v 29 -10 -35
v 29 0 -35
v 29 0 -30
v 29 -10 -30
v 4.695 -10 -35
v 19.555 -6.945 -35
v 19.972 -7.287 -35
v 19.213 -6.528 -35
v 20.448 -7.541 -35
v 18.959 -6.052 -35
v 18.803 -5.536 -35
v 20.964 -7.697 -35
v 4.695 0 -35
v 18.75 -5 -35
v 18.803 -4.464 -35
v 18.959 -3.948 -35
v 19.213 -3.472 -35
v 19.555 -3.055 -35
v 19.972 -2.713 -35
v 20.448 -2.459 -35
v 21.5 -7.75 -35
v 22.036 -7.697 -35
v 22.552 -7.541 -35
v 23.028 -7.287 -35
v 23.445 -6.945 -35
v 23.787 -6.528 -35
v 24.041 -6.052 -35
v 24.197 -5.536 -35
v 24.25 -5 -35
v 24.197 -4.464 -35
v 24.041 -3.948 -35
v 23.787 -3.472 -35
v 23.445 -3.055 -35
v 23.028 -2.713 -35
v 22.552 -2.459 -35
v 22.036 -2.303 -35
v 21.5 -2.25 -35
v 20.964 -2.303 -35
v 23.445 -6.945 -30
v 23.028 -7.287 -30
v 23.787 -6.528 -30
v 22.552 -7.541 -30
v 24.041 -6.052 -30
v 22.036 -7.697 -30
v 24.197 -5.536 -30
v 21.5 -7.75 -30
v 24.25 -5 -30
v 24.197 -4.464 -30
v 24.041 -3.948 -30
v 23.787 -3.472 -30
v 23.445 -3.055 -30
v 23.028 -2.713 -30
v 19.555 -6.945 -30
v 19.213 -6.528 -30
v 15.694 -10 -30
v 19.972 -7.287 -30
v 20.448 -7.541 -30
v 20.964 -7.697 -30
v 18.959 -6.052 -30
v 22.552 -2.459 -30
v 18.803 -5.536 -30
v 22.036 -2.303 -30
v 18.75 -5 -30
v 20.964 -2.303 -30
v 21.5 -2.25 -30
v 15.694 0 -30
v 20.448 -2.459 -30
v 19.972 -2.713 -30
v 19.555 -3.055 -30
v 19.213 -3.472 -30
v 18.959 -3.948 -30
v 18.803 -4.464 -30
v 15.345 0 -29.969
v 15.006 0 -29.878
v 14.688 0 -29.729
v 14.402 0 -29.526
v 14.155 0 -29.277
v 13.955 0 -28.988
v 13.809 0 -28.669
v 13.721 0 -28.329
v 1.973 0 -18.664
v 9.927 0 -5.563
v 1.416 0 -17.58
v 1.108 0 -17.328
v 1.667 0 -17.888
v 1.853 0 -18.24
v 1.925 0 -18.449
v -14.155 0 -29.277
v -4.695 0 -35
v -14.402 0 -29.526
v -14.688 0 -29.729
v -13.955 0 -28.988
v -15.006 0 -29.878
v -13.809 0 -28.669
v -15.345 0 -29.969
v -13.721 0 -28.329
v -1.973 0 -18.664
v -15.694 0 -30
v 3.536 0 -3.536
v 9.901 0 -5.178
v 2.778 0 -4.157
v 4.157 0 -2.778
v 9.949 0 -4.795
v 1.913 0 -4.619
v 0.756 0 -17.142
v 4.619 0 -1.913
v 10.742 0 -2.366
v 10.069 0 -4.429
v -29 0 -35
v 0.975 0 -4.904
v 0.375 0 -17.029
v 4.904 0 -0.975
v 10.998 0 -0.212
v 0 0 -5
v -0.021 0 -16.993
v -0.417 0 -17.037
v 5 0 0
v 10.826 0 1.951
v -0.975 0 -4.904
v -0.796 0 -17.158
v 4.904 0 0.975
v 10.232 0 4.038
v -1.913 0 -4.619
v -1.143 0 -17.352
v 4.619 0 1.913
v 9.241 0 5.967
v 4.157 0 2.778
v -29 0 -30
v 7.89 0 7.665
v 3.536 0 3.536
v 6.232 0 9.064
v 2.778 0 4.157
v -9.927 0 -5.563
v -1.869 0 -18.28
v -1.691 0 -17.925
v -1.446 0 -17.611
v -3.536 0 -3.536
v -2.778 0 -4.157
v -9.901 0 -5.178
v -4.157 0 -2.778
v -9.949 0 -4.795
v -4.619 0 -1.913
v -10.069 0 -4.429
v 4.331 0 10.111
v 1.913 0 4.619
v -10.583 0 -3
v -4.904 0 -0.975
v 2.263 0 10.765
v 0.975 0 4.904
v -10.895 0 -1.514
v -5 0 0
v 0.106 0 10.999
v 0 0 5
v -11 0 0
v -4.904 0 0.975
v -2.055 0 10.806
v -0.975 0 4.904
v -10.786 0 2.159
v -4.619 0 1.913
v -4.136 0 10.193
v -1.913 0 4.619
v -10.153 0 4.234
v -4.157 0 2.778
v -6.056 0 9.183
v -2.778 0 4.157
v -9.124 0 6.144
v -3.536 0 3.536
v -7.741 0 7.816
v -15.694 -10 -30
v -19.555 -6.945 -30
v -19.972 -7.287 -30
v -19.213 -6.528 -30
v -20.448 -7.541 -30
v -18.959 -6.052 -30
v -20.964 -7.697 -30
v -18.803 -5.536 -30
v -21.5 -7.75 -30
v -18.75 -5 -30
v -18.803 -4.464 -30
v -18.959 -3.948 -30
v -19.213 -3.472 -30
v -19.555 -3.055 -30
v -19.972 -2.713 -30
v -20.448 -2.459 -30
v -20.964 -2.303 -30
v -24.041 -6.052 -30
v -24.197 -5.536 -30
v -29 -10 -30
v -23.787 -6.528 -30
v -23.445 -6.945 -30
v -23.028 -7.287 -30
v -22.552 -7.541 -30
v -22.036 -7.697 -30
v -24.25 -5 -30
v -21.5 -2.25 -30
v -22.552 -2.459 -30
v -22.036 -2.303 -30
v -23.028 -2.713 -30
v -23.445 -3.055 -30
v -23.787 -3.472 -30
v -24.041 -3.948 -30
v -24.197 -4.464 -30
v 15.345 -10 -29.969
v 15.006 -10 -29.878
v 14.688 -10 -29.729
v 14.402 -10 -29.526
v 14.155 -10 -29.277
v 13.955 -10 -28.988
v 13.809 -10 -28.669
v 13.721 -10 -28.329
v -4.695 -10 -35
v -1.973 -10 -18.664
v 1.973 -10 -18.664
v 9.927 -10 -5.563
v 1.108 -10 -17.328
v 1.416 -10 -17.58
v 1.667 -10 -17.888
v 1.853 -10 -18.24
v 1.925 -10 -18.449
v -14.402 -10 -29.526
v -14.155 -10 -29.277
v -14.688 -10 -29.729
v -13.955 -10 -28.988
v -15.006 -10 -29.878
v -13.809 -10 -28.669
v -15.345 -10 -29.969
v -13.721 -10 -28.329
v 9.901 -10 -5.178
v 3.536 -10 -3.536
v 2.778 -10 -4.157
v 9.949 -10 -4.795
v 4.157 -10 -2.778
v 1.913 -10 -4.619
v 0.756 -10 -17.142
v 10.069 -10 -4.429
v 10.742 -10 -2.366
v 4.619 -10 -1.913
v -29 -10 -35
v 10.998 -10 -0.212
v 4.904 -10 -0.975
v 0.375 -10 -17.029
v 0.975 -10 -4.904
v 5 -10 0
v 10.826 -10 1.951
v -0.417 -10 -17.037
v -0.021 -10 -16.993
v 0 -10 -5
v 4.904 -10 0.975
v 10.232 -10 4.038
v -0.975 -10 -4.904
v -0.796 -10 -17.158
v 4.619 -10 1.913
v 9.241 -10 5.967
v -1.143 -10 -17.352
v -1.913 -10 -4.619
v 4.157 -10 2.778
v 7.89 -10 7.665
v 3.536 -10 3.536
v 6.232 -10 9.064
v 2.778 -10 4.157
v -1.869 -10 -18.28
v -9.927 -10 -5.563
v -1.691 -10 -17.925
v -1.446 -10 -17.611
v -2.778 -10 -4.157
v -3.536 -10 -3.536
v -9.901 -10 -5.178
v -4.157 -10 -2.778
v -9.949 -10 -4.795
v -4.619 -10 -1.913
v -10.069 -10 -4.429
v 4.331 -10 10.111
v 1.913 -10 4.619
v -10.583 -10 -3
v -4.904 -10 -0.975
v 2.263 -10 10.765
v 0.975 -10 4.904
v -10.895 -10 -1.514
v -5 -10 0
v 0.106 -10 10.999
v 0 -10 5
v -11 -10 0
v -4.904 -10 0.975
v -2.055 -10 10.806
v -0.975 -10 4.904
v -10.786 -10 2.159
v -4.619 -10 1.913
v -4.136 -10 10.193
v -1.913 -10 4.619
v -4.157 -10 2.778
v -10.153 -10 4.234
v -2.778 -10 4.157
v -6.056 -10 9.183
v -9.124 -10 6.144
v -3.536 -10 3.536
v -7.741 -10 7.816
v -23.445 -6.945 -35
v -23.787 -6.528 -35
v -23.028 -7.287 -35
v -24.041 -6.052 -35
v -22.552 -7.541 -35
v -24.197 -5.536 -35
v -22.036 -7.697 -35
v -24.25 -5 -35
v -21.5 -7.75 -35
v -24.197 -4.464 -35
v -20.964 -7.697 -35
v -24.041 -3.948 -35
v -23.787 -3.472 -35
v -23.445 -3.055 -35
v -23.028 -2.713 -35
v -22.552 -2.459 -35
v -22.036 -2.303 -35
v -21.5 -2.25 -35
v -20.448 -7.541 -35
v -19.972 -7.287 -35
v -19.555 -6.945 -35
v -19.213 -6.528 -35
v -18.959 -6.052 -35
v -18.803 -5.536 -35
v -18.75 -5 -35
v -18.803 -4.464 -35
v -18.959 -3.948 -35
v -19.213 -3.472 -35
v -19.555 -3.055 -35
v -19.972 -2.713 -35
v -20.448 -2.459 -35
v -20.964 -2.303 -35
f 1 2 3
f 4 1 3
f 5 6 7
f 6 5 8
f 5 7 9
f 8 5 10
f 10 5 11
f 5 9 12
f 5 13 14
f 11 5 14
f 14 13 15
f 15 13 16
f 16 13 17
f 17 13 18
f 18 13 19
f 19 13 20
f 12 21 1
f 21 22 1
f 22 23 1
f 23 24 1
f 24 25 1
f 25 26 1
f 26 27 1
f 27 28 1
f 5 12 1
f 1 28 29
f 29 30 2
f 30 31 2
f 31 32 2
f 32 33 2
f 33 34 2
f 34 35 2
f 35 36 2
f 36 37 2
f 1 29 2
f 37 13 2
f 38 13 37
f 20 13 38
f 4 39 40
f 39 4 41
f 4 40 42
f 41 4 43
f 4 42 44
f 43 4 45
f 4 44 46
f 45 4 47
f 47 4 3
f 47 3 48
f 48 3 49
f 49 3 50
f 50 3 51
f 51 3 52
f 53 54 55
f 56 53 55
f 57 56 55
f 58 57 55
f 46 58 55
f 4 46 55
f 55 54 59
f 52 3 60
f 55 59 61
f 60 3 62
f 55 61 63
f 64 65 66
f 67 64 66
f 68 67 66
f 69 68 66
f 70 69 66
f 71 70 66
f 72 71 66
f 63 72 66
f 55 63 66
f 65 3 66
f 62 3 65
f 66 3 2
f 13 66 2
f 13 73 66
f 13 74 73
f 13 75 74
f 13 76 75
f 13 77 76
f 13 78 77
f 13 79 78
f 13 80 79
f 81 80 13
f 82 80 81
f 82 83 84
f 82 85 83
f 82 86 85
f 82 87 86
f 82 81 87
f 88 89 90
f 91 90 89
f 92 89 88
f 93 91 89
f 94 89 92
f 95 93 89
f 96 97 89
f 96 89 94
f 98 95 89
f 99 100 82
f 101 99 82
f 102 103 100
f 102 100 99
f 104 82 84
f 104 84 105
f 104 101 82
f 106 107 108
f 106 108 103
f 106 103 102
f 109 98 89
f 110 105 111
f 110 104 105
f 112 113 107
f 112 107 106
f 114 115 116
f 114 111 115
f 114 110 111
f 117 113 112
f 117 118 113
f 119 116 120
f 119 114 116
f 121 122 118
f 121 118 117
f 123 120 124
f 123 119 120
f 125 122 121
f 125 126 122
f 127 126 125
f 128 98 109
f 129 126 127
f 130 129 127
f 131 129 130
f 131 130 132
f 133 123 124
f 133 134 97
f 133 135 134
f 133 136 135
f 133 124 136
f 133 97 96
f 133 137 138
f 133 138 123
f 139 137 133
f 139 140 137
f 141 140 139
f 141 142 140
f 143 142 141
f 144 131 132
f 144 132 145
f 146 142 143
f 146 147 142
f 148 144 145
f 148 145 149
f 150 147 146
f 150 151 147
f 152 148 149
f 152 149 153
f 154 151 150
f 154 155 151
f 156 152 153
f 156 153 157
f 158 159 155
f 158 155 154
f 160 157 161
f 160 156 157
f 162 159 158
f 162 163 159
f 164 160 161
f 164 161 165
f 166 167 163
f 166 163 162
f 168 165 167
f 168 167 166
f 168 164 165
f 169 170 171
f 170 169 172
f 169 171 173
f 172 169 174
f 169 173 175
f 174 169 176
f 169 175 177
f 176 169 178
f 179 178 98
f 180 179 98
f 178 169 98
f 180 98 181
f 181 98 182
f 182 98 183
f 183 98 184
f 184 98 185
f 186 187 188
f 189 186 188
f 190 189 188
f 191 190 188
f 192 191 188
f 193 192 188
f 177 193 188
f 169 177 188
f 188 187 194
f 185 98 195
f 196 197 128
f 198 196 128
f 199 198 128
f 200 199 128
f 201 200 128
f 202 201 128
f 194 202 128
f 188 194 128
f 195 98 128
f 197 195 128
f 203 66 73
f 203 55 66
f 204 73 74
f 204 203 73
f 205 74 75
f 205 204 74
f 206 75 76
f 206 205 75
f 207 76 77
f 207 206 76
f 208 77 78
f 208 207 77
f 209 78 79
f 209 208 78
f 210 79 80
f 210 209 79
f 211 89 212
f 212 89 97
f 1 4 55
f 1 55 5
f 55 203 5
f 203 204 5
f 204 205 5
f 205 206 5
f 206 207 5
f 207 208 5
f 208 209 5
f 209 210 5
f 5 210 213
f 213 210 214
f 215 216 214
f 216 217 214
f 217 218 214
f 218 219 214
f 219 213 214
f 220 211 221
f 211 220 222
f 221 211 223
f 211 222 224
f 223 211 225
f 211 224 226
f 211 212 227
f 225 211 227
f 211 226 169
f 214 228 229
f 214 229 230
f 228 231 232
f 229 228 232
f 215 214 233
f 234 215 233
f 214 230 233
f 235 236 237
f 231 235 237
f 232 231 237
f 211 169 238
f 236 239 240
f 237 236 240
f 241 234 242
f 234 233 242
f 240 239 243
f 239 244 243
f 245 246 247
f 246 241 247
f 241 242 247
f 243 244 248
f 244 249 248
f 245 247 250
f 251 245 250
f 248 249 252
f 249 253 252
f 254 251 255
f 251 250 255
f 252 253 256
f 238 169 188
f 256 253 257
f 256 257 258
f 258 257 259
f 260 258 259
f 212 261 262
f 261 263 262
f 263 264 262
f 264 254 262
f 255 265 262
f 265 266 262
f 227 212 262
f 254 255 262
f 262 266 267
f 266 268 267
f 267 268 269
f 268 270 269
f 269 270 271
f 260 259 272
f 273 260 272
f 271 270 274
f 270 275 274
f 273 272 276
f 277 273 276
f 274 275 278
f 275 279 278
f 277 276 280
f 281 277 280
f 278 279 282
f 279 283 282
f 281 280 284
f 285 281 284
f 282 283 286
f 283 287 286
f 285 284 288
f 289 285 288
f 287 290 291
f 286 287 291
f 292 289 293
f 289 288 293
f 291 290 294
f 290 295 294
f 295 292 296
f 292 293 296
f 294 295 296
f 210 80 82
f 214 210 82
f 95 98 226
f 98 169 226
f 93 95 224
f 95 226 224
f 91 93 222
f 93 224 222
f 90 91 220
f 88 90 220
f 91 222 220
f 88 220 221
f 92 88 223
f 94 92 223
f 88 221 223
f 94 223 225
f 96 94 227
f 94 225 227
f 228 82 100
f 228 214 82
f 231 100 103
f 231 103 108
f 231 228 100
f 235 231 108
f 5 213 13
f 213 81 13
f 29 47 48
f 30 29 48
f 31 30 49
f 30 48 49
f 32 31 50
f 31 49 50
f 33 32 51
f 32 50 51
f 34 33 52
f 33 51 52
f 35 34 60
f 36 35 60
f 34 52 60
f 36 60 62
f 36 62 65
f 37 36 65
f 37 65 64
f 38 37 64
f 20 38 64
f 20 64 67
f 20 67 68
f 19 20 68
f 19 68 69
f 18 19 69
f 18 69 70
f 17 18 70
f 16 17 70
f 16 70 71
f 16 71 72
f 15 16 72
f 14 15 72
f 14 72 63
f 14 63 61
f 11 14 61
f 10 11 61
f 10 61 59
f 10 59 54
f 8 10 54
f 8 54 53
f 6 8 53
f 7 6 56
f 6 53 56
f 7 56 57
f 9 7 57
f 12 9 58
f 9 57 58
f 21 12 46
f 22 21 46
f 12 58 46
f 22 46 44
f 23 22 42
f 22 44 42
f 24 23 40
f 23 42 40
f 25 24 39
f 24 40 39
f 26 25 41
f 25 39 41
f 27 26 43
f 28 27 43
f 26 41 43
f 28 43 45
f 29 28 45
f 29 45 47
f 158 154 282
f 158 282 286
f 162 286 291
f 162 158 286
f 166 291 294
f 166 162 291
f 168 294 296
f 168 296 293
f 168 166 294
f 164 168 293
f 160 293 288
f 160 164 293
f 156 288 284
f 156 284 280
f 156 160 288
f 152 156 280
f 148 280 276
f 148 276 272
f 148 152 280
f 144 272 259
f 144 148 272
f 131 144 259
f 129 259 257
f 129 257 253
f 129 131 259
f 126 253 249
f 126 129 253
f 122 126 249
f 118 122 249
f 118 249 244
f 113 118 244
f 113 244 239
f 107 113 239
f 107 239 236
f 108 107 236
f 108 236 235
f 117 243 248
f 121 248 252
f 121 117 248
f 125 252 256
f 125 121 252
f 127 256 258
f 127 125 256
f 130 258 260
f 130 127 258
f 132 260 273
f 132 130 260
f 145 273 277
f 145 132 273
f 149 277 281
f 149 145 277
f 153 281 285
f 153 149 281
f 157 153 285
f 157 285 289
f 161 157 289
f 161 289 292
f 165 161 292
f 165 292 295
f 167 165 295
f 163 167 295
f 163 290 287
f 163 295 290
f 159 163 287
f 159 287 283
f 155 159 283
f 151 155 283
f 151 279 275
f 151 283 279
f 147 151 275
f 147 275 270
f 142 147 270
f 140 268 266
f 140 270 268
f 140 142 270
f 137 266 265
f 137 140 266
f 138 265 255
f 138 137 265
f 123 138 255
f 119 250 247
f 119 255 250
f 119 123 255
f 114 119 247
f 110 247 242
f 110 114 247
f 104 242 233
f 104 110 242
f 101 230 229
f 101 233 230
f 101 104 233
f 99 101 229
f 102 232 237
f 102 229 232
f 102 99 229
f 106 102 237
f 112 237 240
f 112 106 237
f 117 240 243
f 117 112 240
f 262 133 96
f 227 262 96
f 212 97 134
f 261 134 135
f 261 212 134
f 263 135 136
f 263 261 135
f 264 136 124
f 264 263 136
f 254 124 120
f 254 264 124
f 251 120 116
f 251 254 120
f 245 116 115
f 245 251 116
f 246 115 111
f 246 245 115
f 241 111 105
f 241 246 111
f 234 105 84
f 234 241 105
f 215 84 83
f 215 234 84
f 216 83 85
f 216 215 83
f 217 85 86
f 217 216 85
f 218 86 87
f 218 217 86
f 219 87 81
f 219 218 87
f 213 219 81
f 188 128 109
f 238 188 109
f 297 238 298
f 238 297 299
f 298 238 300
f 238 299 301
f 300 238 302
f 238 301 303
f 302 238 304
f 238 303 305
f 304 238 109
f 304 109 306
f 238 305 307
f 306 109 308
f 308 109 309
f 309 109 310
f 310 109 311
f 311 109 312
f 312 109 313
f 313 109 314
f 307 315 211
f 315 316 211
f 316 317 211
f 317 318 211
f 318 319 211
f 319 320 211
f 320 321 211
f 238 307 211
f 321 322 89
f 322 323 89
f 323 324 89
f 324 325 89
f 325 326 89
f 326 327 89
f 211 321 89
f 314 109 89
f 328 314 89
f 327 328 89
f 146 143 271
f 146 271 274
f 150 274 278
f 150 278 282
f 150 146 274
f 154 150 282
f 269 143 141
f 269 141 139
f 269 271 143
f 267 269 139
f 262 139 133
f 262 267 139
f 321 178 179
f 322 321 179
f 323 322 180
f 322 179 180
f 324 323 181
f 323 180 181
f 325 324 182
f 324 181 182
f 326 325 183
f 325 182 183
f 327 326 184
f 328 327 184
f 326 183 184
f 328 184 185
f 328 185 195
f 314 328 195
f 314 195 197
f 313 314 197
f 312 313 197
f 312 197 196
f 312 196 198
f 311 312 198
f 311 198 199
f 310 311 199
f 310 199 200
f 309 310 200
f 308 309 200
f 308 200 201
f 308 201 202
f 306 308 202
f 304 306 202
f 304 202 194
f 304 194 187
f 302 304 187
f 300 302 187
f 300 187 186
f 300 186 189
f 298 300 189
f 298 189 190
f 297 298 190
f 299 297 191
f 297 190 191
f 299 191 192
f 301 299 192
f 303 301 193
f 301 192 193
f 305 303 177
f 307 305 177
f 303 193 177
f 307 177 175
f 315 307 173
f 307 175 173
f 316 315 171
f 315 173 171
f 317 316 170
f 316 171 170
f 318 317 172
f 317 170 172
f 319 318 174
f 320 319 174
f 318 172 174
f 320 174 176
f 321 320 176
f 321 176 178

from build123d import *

# Parameters (mm, degrees)
F0_R     = 5
F1_DEPTH = 10
F2_R     = 2.75
F3_DEPTH = 5.001
F4_R     = 5
F5_DEPTH = 10
F6_R     = 2


with BuildPart() as f1:
    # F0 (on Front) → F1 (new body)
    with BuildSketch(Plane.XZ):
        with BuildLine():
            ThreePointArc((-0.3608562494, -8.9927627995), (-6.4902891401, -6.2350739272), (-9, 0))
            Line((-9, 0), (-14, -30))
            Line((-14, -30), (-29, -30))
            Line((-29, -30), (-29, -35))
            Line((-29, -35), (-4.6953957828, -35))
            Line((-4.6953957828, -35), (-0.3608562494, -8.9927627995))
        make_face()
        with BuildLine():
            ThreePointArc((0.3608562494, -8.9927627995), (6.4902891401, -6.2350739272), (9, 0))
            ThreePointArc((9, 0), (0, 9), (-9, 0))
            ThreePointArc((-9, 0), (-6.4902891401, -6.2350739272), (-0.3608562494, -8.9927627995))
            Line((-0.3608562494, -8.9927627995), (0, -6.827625303))
            Line((0, -6.827625303), (0.3608562494, -8.9927627995))
        make_face()
        Circle(F0_R, mode=Mode.SUBTRACT)
        with BuildLine():
            Line((14, -30), (9, 0))
            ThreePointArc((9, 0), (6.4902891401, -6.2350739272), (0.3608562494, -8.9927627995))
            Line((0.3608562494, -8.9927627995), (4.6953957828, -35))
            Line((4.6953957828, -35), (29, -35))
            Line((29, -35), (29, -30))
            Line((29, -30), (14, -30))
        make_face()
    extrude(amount=F1_DEPTH)

    # F2 (on face) → F3 (cut, through all)
    with BuildSketch(Plane.XY.offset(-30)):
        with Locations((-21.5, -5)):
            Circle(F2_R)
        with Locations((21.5, -5)):
            Circle(F2_R)
    extrude(amount=-F3_DEPTH, mode=Mode.SUBTRACT)

    # F4 (on face) → F5 (join, through all)
    with BuildSketch(Plane(origin=(0, 0, 0), x_dir=(-1, 0, 0), z_dir=(0, 1, 0))):
        with BuildLine():
            ThreePointArc((9.8245808792, -4.9474852752), (10.7021116998, -2.542598113), (11, 0))
            ThreePointArc((11, 0), (-2.542598113, 10.7021116998), (-9.8245808792, -4.9474852752))
            Line((-9.8245808792, -4.9474852752), (-9, 0))
            ThreePointArc((-9, 0), (0, 9), (9, 0))
            Line((9, 0), (9.8245808792, -4.9474852752))
        make_face()
        with BuildLine():
            Line((-9, 0), (-9.8245808792, -4.9474852752))
            ThreePointArc((-9.8245808792, -4.9474852752), (-6.0614233206, -9.1792781485), (-0.6917668776, -10.9782265684))
            Line((-0.6917668776, -10.9782265684), (0, -6.827625303))
            Line((0, -6.827625303), (0.6917668776, -10.9782265684))
            ThreePointArc((0.6917668776, -10.9782265684), (6.0614233206, -9.1792781485), (9.8245808792, -4.9474852752))
            Line((9.8245808792, -4.9474852752), (9, 0))
            ThreePointArc((9, 0), (0, 9), (-9, 0))
        make_face()
        Circle(F4_R, mode=Mode.SUBTRACT)
    extrude(amount=-F5_DEPTH)

    # F6
    f6_edges = [f1.edges().sort_by_distance(p)[0] for p in [
        (0, -5, -6.827625),
        (-14, -5, -30),
        (14, -5, -30),
        (-9.824581, -5, -4.947485),
        (9.824581, -5, -4.947485),
    ]]
    fillet(f6_edges, radius=F6_R)


solid = f1.part
